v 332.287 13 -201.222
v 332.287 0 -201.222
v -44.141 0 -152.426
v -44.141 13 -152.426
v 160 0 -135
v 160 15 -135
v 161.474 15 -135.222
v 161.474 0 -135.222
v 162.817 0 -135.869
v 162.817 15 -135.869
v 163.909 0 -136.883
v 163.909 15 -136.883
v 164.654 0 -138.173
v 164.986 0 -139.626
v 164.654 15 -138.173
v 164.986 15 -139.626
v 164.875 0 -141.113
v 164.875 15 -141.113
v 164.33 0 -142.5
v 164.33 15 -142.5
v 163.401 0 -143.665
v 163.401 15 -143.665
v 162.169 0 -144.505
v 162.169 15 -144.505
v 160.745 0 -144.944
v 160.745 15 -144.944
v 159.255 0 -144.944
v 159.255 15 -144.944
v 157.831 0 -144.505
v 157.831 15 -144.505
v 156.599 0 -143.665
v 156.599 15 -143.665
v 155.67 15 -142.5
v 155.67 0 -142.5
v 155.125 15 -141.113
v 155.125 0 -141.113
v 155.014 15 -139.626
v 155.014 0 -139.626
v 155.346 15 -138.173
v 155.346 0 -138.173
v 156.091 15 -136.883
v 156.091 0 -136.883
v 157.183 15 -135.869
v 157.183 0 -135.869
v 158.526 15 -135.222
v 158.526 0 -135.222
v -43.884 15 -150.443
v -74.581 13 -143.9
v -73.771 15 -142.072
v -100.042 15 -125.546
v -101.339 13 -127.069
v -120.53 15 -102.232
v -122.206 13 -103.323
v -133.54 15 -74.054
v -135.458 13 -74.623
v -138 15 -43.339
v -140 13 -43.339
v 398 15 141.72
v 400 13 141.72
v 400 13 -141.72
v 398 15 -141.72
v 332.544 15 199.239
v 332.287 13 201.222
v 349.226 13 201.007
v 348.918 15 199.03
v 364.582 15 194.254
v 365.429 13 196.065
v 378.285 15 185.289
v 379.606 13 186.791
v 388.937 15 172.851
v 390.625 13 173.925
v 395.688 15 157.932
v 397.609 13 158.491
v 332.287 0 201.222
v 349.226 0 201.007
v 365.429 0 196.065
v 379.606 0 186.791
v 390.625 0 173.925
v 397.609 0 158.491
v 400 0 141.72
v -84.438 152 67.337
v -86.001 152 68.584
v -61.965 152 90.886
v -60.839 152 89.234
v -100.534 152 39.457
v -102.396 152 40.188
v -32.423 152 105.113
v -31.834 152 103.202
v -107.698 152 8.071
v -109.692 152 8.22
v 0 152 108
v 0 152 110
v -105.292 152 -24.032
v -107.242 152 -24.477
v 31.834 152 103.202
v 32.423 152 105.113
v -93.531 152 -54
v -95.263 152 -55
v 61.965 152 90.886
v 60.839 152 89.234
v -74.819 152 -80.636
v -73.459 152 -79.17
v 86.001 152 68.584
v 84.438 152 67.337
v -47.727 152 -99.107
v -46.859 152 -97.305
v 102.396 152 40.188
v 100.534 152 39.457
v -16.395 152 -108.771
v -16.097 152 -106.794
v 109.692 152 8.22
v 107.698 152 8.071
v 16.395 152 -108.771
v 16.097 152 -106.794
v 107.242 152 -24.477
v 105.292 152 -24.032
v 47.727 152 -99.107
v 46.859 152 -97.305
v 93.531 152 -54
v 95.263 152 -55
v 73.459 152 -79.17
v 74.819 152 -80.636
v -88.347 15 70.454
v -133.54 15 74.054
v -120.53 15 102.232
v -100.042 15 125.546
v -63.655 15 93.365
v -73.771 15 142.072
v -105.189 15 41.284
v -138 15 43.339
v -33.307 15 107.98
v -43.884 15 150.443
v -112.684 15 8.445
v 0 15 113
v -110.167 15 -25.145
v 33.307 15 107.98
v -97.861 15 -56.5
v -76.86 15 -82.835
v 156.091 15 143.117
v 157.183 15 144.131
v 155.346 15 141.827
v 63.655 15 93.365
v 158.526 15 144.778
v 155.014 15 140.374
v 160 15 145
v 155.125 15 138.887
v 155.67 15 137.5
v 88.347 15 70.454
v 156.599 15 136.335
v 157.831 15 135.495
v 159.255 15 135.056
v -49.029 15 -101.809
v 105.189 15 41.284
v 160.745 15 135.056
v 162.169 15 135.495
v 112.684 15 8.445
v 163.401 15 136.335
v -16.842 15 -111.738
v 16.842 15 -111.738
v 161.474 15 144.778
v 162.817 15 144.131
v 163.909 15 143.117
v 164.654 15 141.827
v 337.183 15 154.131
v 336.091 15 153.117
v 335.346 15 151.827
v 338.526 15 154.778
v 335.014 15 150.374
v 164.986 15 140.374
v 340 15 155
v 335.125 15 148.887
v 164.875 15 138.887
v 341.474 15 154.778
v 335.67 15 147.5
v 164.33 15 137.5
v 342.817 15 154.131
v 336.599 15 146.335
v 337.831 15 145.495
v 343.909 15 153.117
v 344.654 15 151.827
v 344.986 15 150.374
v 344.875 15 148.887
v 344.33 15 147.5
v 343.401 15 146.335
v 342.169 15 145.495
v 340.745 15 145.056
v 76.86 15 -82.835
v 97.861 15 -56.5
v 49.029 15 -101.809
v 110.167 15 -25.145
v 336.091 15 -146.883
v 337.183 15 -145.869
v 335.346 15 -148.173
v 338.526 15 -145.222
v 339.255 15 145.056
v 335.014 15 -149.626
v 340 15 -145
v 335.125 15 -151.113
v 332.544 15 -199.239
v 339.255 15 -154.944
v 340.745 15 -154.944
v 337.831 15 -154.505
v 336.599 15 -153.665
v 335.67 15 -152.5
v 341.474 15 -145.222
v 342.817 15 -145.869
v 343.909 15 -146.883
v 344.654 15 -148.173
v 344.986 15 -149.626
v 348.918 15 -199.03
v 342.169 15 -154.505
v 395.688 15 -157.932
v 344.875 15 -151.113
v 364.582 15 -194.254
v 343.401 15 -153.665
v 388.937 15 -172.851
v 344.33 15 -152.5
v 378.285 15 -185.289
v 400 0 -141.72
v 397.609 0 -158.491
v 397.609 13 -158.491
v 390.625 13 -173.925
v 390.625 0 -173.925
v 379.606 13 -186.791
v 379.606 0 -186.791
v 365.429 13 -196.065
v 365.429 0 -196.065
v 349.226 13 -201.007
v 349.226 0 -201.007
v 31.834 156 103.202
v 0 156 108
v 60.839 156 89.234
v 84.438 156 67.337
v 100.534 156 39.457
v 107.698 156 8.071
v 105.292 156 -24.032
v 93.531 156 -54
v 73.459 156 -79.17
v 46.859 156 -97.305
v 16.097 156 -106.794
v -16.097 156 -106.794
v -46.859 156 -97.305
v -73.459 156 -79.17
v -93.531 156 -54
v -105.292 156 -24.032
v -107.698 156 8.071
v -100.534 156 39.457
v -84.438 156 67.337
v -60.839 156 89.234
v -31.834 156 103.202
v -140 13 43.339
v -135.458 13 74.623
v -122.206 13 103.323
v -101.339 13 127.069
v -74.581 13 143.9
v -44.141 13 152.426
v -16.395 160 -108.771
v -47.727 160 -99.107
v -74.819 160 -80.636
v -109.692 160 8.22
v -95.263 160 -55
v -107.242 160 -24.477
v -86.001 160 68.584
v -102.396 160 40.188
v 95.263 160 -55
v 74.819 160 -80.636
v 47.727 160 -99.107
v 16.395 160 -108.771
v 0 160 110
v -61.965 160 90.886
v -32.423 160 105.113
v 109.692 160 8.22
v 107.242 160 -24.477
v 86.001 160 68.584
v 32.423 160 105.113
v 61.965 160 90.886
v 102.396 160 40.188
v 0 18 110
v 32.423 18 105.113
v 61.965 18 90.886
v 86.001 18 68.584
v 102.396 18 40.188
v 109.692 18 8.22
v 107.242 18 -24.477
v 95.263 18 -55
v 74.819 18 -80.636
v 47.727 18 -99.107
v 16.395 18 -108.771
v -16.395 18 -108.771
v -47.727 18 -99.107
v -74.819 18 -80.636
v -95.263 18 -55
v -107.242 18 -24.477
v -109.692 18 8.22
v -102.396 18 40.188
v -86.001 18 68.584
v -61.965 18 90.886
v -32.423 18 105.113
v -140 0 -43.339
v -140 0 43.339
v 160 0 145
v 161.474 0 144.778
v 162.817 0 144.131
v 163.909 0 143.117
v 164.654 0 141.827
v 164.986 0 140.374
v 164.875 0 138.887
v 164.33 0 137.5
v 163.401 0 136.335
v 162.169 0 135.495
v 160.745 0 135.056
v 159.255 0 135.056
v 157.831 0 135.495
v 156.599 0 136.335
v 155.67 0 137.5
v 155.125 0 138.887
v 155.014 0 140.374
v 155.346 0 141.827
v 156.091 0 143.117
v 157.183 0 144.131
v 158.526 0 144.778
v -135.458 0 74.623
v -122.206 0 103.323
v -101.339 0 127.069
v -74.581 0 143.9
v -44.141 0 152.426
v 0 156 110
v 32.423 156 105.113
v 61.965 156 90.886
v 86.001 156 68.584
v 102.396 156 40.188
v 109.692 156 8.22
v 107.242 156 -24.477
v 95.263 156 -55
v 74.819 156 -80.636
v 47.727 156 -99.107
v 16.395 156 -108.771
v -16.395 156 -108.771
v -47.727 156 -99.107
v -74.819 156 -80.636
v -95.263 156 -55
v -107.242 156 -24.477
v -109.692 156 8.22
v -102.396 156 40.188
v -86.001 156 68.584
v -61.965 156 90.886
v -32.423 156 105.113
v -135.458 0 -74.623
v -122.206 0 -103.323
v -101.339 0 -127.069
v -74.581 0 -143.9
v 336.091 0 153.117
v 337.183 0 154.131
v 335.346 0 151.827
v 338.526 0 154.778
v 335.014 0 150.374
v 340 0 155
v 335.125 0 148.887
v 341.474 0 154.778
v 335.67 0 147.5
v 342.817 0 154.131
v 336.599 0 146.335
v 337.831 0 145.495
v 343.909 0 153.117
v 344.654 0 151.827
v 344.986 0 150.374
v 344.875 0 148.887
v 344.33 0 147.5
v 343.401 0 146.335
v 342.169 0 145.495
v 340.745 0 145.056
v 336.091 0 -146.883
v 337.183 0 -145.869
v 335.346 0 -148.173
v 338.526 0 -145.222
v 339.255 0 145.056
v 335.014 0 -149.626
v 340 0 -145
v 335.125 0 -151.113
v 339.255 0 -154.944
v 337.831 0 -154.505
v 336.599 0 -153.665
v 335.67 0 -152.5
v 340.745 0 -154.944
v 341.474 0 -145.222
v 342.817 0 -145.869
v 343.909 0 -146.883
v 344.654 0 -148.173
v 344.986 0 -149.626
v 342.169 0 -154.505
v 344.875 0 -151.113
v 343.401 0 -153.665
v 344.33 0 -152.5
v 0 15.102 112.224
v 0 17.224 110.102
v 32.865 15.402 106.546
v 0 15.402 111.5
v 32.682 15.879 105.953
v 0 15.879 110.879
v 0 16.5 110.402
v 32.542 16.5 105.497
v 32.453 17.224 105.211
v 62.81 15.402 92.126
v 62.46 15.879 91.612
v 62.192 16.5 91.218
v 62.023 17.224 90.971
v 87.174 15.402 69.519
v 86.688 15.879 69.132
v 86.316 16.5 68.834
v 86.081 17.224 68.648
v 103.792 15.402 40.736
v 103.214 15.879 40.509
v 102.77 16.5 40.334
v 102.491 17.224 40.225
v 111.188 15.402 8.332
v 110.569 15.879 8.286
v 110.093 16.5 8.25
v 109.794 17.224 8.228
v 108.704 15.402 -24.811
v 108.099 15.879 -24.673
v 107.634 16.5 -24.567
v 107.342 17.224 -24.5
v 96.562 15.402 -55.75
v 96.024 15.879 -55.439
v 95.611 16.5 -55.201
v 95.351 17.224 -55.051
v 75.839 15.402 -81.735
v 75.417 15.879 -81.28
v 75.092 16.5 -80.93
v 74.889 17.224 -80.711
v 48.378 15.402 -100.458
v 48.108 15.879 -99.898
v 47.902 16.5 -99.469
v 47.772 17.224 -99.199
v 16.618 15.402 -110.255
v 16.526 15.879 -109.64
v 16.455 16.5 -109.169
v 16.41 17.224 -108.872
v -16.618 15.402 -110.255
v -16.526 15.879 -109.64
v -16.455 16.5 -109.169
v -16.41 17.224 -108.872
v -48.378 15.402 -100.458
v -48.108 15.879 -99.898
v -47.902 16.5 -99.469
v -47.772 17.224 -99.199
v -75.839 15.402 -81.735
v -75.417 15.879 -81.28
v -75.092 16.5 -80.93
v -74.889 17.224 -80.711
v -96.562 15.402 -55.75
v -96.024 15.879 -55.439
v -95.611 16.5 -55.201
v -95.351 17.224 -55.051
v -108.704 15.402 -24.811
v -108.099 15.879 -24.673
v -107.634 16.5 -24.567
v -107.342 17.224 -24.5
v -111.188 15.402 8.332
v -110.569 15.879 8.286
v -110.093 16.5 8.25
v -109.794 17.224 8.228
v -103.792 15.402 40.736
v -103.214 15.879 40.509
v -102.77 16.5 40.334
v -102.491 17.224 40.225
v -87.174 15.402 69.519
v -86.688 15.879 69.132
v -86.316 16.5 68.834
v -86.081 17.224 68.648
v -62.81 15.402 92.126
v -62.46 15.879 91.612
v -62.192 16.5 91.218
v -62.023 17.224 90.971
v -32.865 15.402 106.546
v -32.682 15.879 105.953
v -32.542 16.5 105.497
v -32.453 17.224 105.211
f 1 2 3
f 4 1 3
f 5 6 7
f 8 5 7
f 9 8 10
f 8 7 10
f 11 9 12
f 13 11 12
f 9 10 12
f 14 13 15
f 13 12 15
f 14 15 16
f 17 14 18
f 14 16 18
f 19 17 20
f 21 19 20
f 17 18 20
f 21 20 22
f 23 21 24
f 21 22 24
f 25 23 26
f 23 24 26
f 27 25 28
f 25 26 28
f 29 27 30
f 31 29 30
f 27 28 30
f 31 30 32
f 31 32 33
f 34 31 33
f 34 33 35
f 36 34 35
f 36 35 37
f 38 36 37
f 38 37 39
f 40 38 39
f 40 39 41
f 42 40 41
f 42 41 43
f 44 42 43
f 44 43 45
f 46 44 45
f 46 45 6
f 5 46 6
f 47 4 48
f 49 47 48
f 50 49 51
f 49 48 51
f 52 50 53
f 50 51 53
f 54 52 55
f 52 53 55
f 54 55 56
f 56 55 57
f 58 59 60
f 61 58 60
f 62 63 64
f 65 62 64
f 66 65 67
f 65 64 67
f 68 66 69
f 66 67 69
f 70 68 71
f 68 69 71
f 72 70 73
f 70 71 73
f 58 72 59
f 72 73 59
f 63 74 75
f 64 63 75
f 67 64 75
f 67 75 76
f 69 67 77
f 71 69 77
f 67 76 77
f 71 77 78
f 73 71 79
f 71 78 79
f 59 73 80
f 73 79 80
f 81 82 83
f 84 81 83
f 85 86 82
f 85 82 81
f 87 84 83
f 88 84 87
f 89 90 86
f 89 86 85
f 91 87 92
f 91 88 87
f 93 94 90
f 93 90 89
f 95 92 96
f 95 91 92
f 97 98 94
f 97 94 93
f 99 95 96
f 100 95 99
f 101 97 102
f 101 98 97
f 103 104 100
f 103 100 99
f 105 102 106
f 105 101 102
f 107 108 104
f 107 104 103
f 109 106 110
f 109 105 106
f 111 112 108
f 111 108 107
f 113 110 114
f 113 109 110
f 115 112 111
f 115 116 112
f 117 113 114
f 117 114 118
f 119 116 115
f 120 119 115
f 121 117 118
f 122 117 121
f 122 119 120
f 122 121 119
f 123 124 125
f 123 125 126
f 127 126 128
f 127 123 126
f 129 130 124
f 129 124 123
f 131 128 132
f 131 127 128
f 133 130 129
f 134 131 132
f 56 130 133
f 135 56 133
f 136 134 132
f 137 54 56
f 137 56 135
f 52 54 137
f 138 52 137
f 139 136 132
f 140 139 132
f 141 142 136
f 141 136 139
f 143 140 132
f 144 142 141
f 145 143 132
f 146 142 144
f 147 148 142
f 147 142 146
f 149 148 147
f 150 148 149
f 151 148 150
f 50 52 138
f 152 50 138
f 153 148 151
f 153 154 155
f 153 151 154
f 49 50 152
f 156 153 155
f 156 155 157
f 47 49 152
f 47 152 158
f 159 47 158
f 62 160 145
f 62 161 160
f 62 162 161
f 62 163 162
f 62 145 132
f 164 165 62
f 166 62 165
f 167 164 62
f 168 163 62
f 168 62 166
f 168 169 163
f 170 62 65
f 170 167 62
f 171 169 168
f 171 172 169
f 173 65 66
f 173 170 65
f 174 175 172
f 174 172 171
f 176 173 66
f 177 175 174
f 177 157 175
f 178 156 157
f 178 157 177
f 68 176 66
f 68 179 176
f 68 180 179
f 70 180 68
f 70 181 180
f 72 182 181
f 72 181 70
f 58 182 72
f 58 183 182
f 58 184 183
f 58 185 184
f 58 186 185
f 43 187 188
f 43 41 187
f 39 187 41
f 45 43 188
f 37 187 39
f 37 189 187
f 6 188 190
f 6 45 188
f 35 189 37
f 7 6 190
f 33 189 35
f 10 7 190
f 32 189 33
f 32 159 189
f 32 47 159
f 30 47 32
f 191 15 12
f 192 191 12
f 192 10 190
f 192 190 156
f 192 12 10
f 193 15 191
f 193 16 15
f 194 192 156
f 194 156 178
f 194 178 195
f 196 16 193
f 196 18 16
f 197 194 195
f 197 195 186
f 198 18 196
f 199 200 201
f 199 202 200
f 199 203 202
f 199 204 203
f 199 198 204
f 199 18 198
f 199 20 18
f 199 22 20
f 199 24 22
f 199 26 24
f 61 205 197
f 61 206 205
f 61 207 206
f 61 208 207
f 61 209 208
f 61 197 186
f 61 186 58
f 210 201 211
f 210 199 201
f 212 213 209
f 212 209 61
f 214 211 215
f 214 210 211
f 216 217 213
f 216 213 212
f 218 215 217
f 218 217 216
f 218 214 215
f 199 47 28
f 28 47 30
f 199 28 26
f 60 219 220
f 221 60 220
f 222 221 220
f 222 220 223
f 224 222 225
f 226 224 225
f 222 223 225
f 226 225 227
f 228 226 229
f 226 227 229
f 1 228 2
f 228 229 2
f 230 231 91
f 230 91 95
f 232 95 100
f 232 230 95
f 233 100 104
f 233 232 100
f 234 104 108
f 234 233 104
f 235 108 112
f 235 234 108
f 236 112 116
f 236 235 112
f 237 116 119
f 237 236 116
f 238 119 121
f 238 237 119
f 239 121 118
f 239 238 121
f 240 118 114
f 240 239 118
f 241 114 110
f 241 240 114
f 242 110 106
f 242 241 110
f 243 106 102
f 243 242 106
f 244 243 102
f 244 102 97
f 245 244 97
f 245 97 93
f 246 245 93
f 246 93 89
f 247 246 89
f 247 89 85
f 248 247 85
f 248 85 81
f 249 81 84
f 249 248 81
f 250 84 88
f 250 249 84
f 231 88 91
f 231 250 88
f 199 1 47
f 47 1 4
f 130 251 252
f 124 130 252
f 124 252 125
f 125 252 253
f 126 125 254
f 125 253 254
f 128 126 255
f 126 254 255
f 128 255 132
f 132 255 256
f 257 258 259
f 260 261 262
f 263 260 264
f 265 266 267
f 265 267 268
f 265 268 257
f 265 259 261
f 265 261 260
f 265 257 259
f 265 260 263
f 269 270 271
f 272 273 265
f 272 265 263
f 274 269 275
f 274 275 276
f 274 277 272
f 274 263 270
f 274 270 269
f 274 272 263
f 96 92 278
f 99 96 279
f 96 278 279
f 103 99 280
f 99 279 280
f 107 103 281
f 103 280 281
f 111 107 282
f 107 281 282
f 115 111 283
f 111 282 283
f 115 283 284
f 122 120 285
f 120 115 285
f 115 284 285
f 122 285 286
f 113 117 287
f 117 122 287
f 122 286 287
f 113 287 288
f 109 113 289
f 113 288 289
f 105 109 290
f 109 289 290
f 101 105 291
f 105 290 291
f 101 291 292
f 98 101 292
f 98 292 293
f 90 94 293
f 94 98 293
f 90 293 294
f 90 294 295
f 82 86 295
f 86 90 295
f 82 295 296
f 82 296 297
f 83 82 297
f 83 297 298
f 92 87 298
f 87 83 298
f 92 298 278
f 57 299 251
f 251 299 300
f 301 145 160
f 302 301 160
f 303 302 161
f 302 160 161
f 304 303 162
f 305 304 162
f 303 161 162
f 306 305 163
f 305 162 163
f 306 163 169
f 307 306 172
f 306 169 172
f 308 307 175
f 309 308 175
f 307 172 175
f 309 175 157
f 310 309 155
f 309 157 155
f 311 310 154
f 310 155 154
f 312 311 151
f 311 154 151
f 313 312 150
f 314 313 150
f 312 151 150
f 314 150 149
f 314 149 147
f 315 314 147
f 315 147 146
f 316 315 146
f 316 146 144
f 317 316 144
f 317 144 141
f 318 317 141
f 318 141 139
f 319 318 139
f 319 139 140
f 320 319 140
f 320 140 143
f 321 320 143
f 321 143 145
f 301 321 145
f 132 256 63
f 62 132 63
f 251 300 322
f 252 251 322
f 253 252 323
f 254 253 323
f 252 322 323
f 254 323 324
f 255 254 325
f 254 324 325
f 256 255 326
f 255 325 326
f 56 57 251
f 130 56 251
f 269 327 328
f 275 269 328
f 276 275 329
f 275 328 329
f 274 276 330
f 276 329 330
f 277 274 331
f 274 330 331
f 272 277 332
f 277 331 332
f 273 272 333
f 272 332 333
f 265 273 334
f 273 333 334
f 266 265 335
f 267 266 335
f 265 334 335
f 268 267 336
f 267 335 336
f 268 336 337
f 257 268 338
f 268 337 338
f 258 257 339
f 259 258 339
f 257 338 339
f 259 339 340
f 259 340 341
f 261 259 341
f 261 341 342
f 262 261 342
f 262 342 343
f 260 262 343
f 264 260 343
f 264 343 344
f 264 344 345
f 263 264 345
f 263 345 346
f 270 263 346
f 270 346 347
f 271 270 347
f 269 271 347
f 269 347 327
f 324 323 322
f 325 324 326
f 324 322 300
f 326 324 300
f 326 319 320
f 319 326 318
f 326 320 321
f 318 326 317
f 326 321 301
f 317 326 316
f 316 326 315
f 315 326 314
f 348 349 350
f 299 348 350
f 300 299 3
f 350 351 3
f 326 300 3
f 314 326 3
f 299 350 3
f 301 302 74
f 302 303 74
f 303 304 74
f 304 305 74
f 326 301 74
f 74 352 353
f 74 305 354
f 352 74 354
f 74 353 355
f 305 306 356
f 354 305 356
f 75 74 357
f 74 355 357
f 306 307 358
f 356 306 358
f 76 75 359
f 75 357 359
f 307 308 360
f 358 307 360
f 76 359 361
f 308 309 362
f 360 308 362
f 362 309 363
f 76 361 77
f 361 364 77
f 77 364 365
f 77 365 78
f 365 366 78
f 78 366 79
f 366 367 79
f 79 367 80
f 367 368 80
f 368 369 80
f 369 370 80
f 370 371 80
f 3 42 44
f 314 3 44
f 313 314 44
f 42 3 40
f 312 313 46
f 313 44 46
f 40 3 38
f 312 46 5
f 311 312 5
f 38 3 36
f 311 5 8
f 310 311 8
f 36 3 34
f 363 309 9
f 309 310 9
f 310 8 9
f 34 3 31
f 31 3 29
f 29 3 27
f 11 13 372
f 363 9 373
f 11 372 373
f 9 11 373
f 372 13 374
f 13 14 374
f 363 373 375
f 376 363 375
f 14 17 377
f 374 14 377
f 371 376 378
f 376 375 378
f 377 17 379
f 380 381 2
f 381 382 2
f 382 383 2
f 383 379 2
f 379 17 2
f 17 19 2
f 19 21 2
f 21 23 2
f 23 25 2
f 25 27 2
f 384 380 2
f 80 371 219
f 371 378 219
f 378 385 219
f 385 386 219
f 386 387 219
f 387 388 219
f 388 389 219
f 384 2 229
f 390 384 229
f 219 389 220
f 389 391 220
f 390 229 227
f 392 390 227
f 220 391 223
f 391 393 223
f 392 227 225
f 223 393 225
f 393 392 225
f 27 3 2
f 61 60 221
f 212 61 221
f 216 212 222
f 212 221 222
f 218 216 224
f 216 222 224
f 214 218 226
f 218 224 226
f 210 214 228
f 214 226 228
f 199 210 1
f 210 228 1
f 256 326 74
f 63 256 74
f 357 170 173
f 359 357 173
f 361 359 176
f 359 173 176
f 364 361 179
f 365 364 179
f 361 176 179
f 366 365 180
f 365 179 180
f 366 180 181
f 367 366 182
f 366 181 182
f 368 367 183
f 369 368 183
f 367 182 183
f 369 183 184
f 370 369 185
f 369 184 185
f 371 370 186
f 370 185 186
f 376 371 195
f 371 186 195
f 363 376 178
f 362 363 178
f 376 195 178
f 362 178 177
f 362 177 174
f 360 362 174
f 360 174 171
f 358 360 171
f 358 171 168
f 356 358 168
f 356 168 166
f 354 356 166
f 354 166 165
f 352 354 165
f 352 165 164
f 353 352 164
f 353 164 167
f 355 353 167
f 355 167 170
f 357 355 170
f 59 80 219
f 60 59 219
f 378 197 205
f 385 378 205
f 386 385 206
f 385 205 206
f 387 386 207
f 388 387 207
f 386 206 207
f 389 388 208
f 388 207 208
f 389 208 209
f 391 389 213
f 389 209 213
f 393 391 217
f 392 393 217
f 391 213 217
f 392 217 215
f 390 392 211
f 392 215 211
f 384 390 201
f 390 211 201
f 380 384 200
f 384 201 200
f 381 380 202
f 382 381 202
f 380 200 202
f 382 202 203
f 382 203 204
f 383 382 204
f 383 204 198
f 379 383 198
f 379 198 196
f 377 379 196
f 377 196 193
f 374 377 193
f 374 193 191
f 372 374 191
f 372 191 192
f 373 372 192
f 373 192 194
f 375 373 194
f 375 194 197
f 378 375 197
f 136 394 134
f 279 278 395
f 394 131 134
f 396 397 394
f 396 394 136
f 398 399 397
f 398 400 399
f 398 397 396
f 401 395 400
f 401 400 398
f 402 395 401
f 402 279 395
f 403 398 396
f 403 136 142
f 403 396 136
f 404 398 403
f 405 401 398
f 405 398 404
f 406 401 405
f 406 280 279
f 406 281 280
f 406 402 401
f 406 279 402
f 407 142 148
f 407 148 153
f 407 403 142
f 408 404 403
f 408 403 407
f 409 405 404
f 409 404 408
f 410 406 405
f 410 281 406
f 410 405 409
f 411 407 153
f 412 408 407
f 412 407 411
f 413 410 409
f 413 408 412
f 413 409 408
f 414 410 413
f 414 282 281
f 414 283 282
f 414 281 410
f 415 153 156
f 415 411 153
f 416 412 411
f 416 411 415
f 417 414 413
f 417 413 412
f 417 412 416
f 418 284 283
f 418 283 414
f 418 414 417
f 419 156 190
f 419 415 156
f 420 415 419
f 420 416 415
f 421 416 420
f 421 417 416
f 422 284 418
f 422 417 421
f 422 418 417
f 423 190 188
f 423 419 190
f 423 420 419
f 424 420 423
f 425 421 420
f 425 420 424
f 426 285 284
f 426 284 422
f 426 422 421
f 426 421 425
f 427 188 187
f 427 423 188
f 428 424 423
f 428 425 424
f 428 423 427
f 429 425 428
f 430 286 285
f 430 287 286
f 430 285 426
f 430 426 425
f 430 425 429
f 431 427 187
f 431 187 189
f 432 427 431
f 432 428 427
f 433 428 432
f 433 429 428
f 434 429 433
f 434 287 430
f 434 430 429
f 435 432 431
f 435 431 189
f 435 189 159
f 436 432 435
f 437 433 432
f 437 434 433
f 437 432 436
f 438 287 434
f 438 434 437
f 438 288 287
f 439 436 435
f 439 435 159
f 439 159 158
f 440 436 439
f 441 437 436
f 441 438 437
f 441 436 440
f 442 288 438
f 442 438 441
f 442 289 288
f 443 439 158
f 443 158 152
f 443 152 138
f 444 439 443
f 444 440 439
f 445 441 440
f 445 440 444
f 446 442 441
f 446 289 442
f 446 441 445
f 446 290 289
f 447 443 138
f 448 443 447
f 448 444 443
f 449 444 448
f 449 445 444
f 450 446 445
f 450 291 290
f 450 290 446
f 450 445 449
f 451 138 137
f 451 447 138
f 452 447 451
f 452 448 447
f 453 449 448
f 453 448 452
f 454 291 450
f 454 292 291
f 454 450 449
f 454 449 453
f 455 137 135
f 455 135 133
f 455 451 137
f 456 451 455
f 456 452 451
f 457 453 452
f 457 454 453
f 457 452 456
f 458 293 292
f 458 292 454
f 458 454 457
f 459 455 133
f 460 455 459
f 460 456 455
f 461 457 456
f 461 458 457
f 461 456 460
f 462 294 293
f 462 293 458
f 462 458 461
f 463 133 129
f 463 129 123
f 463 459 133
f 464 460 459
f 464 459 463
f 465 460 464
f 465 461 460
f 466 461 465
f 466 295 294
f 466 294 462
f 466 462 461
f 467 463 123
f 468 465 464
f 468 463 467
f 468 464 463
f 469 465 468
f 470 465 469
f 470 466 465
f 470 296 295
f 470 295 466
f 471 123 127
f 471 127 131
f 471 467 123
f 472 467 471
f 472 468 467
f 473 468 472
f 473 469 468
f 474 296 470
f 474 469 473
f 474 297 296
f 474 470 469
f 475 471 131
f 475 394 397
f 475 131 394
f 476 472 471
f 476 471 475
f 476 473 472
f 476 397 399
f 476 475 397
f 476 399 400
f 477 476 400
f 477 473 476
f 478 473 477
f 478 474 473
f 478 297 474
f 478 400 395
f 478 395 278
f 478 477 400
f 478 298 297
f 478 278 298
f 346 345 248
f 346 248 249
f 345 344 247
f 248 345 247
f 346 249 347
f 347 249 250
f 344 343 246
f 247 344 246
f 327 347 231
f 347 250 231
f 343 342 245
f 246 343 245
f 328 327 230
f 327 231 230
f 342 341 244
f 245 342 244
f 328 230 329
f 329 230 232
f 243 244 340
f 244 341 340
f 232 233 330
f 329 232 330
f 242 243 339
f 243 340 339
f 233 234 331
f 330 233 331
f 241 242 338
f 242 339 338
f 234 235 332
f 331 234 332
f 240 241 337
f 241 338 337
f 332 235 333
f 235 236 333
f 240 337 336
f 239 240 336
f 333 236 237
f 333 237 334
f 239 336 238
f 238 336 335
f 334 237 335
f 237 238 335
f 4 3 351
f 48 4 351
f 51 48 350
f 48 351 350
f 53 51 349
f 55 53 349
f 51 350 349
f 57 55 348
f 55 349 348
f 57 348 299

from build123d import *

# Parameters (mm, degrees)
BOSS_EXTRU_1_DEPTH      = 15
ESQUISSE2_R             = 110
BOSS_EXTRU_2_DEPTH      = 145
ESQUISSE3_R             = 111
ESQUISSE3_R_2           = 108
ENL_V_MAT_EXTRU_1_DEPTH = 4
ESQUISSE4_R             = 5
ENL_V_MAT_EXTRU_2_DEPTH = 471.867329483
CONG_1_R                = 3
CHANFREIN1_SIZE         = 2


with BuildPart() as part:
    # Esquisse1 → Boss.-Extru.1 (new body)
    with BuildSketch(Plane(origin=(0, 0, 0), x_dir=(1, 0, 0), z_dir=(0, 1, 0))):
        with BuildLine():
            Line((-140, 43.338898303), (-140, -43.338898303))
            ThreePointArc((-140, -43.338898303), (-112.630211626, -115.949146387), (-44.140943151, -152.426174036))
            Line((-44.140943151, -152.426174036), (332.286758282, -201.222357555))
            ThreePointArc((332.286758282, -201.222357555), (379.605589864, -186.791231678), (400, -141.720207155))
            Line((400, -141.720207155), (400, 141.720207155))
            ThreePointArc((400, 141.720207155), (379.605589864, 186.791231678), (332.286758282, 201.222357555))
            Line((332.286758282, 201.222357555), (-44.140943151, 152.426174036))
            ThreePointArc((-44.140943151, 152.426174036), (-112.630211626, 115.949146387), (-140, 43.338898303))
        make_face()
    extrude(amount=BOSS_EXTRU_1_DEPTH)

    # Esquisse2 → Boss.-Extru.2 (add)
    with BuildSketch(Plane(origin=(0, 15, 0), x_dir=(1, 0, 0), z_dir=(0, 1, 0))):
        Circle(ESQUISSE2_R)
    extrude(amount=BOSS_EXTRU_2_DEPTH)

    # Esquisse3 → Enlèv. mat.-Extru.1 (cut)
    with BuildSketch(Plane(origin=(0, 156, 0), x_dir=(1, 0, 0), z_dir=(0, 1, 0))):
        Circle(ESQUISSE3_R)
        Circle(ESQUISSE3_R_2, mode=Mode.SUBTRACT)
    extrude(amount=-ENL_V_MAT_EXTRU_1_DEPTH, mode=Mode.SUBTRACT)

    # Esquisse4 → Enlèv. mat.-Extru.2 (cut, through all)
    with BuildSketch(Plane(origin=(0, 15, 0), x_dir=(1, 0, 0), z_dir=(0, 1, 0))):
        with Locations((340, -150)):
            Circle(ESQUISSE4_R)
        with Locations((340, 150)):
            Circle(ESQUISSE4_R)
        with Locations((160, -140)):
            Circle(ESQUISSE4_R)
        with Locations((160, 140)):
            Circle(ESQUISSE4_R)
    extrude(amount=-ENL_V_MAT_EXTRU_2_DEPTH, mode=Mode.SUBTRACT)

    # Congé1
    cong_1_edges = [part.edges().sort_by_distance(p)[0] for p in [
        (-110, 15, 0),
    ]]
    fillet(cong_1_edges, radius=CONG_1_R)

    # Chanfrein1
    chanfrein1_edges = [part.edges().sort_by_distance(p)[0] for p in [
        (379.605589864, 15, 186.791231678),
        (400, 15, 0),
        (144.072907565, 15, 176.824265796),
        (379.605589864, 15, -186.791231678),
        (-112.630211626, 15, 115.949146387),
        (144.072907565, 15, -176.824265796),
        (-140, 15, 0),
        (-112.630211626, 15, -115.949146387),
    ]]
    chamfer(chanfrein1_edges, length=CHANFREIN1_SIZE)


solid = part.part
